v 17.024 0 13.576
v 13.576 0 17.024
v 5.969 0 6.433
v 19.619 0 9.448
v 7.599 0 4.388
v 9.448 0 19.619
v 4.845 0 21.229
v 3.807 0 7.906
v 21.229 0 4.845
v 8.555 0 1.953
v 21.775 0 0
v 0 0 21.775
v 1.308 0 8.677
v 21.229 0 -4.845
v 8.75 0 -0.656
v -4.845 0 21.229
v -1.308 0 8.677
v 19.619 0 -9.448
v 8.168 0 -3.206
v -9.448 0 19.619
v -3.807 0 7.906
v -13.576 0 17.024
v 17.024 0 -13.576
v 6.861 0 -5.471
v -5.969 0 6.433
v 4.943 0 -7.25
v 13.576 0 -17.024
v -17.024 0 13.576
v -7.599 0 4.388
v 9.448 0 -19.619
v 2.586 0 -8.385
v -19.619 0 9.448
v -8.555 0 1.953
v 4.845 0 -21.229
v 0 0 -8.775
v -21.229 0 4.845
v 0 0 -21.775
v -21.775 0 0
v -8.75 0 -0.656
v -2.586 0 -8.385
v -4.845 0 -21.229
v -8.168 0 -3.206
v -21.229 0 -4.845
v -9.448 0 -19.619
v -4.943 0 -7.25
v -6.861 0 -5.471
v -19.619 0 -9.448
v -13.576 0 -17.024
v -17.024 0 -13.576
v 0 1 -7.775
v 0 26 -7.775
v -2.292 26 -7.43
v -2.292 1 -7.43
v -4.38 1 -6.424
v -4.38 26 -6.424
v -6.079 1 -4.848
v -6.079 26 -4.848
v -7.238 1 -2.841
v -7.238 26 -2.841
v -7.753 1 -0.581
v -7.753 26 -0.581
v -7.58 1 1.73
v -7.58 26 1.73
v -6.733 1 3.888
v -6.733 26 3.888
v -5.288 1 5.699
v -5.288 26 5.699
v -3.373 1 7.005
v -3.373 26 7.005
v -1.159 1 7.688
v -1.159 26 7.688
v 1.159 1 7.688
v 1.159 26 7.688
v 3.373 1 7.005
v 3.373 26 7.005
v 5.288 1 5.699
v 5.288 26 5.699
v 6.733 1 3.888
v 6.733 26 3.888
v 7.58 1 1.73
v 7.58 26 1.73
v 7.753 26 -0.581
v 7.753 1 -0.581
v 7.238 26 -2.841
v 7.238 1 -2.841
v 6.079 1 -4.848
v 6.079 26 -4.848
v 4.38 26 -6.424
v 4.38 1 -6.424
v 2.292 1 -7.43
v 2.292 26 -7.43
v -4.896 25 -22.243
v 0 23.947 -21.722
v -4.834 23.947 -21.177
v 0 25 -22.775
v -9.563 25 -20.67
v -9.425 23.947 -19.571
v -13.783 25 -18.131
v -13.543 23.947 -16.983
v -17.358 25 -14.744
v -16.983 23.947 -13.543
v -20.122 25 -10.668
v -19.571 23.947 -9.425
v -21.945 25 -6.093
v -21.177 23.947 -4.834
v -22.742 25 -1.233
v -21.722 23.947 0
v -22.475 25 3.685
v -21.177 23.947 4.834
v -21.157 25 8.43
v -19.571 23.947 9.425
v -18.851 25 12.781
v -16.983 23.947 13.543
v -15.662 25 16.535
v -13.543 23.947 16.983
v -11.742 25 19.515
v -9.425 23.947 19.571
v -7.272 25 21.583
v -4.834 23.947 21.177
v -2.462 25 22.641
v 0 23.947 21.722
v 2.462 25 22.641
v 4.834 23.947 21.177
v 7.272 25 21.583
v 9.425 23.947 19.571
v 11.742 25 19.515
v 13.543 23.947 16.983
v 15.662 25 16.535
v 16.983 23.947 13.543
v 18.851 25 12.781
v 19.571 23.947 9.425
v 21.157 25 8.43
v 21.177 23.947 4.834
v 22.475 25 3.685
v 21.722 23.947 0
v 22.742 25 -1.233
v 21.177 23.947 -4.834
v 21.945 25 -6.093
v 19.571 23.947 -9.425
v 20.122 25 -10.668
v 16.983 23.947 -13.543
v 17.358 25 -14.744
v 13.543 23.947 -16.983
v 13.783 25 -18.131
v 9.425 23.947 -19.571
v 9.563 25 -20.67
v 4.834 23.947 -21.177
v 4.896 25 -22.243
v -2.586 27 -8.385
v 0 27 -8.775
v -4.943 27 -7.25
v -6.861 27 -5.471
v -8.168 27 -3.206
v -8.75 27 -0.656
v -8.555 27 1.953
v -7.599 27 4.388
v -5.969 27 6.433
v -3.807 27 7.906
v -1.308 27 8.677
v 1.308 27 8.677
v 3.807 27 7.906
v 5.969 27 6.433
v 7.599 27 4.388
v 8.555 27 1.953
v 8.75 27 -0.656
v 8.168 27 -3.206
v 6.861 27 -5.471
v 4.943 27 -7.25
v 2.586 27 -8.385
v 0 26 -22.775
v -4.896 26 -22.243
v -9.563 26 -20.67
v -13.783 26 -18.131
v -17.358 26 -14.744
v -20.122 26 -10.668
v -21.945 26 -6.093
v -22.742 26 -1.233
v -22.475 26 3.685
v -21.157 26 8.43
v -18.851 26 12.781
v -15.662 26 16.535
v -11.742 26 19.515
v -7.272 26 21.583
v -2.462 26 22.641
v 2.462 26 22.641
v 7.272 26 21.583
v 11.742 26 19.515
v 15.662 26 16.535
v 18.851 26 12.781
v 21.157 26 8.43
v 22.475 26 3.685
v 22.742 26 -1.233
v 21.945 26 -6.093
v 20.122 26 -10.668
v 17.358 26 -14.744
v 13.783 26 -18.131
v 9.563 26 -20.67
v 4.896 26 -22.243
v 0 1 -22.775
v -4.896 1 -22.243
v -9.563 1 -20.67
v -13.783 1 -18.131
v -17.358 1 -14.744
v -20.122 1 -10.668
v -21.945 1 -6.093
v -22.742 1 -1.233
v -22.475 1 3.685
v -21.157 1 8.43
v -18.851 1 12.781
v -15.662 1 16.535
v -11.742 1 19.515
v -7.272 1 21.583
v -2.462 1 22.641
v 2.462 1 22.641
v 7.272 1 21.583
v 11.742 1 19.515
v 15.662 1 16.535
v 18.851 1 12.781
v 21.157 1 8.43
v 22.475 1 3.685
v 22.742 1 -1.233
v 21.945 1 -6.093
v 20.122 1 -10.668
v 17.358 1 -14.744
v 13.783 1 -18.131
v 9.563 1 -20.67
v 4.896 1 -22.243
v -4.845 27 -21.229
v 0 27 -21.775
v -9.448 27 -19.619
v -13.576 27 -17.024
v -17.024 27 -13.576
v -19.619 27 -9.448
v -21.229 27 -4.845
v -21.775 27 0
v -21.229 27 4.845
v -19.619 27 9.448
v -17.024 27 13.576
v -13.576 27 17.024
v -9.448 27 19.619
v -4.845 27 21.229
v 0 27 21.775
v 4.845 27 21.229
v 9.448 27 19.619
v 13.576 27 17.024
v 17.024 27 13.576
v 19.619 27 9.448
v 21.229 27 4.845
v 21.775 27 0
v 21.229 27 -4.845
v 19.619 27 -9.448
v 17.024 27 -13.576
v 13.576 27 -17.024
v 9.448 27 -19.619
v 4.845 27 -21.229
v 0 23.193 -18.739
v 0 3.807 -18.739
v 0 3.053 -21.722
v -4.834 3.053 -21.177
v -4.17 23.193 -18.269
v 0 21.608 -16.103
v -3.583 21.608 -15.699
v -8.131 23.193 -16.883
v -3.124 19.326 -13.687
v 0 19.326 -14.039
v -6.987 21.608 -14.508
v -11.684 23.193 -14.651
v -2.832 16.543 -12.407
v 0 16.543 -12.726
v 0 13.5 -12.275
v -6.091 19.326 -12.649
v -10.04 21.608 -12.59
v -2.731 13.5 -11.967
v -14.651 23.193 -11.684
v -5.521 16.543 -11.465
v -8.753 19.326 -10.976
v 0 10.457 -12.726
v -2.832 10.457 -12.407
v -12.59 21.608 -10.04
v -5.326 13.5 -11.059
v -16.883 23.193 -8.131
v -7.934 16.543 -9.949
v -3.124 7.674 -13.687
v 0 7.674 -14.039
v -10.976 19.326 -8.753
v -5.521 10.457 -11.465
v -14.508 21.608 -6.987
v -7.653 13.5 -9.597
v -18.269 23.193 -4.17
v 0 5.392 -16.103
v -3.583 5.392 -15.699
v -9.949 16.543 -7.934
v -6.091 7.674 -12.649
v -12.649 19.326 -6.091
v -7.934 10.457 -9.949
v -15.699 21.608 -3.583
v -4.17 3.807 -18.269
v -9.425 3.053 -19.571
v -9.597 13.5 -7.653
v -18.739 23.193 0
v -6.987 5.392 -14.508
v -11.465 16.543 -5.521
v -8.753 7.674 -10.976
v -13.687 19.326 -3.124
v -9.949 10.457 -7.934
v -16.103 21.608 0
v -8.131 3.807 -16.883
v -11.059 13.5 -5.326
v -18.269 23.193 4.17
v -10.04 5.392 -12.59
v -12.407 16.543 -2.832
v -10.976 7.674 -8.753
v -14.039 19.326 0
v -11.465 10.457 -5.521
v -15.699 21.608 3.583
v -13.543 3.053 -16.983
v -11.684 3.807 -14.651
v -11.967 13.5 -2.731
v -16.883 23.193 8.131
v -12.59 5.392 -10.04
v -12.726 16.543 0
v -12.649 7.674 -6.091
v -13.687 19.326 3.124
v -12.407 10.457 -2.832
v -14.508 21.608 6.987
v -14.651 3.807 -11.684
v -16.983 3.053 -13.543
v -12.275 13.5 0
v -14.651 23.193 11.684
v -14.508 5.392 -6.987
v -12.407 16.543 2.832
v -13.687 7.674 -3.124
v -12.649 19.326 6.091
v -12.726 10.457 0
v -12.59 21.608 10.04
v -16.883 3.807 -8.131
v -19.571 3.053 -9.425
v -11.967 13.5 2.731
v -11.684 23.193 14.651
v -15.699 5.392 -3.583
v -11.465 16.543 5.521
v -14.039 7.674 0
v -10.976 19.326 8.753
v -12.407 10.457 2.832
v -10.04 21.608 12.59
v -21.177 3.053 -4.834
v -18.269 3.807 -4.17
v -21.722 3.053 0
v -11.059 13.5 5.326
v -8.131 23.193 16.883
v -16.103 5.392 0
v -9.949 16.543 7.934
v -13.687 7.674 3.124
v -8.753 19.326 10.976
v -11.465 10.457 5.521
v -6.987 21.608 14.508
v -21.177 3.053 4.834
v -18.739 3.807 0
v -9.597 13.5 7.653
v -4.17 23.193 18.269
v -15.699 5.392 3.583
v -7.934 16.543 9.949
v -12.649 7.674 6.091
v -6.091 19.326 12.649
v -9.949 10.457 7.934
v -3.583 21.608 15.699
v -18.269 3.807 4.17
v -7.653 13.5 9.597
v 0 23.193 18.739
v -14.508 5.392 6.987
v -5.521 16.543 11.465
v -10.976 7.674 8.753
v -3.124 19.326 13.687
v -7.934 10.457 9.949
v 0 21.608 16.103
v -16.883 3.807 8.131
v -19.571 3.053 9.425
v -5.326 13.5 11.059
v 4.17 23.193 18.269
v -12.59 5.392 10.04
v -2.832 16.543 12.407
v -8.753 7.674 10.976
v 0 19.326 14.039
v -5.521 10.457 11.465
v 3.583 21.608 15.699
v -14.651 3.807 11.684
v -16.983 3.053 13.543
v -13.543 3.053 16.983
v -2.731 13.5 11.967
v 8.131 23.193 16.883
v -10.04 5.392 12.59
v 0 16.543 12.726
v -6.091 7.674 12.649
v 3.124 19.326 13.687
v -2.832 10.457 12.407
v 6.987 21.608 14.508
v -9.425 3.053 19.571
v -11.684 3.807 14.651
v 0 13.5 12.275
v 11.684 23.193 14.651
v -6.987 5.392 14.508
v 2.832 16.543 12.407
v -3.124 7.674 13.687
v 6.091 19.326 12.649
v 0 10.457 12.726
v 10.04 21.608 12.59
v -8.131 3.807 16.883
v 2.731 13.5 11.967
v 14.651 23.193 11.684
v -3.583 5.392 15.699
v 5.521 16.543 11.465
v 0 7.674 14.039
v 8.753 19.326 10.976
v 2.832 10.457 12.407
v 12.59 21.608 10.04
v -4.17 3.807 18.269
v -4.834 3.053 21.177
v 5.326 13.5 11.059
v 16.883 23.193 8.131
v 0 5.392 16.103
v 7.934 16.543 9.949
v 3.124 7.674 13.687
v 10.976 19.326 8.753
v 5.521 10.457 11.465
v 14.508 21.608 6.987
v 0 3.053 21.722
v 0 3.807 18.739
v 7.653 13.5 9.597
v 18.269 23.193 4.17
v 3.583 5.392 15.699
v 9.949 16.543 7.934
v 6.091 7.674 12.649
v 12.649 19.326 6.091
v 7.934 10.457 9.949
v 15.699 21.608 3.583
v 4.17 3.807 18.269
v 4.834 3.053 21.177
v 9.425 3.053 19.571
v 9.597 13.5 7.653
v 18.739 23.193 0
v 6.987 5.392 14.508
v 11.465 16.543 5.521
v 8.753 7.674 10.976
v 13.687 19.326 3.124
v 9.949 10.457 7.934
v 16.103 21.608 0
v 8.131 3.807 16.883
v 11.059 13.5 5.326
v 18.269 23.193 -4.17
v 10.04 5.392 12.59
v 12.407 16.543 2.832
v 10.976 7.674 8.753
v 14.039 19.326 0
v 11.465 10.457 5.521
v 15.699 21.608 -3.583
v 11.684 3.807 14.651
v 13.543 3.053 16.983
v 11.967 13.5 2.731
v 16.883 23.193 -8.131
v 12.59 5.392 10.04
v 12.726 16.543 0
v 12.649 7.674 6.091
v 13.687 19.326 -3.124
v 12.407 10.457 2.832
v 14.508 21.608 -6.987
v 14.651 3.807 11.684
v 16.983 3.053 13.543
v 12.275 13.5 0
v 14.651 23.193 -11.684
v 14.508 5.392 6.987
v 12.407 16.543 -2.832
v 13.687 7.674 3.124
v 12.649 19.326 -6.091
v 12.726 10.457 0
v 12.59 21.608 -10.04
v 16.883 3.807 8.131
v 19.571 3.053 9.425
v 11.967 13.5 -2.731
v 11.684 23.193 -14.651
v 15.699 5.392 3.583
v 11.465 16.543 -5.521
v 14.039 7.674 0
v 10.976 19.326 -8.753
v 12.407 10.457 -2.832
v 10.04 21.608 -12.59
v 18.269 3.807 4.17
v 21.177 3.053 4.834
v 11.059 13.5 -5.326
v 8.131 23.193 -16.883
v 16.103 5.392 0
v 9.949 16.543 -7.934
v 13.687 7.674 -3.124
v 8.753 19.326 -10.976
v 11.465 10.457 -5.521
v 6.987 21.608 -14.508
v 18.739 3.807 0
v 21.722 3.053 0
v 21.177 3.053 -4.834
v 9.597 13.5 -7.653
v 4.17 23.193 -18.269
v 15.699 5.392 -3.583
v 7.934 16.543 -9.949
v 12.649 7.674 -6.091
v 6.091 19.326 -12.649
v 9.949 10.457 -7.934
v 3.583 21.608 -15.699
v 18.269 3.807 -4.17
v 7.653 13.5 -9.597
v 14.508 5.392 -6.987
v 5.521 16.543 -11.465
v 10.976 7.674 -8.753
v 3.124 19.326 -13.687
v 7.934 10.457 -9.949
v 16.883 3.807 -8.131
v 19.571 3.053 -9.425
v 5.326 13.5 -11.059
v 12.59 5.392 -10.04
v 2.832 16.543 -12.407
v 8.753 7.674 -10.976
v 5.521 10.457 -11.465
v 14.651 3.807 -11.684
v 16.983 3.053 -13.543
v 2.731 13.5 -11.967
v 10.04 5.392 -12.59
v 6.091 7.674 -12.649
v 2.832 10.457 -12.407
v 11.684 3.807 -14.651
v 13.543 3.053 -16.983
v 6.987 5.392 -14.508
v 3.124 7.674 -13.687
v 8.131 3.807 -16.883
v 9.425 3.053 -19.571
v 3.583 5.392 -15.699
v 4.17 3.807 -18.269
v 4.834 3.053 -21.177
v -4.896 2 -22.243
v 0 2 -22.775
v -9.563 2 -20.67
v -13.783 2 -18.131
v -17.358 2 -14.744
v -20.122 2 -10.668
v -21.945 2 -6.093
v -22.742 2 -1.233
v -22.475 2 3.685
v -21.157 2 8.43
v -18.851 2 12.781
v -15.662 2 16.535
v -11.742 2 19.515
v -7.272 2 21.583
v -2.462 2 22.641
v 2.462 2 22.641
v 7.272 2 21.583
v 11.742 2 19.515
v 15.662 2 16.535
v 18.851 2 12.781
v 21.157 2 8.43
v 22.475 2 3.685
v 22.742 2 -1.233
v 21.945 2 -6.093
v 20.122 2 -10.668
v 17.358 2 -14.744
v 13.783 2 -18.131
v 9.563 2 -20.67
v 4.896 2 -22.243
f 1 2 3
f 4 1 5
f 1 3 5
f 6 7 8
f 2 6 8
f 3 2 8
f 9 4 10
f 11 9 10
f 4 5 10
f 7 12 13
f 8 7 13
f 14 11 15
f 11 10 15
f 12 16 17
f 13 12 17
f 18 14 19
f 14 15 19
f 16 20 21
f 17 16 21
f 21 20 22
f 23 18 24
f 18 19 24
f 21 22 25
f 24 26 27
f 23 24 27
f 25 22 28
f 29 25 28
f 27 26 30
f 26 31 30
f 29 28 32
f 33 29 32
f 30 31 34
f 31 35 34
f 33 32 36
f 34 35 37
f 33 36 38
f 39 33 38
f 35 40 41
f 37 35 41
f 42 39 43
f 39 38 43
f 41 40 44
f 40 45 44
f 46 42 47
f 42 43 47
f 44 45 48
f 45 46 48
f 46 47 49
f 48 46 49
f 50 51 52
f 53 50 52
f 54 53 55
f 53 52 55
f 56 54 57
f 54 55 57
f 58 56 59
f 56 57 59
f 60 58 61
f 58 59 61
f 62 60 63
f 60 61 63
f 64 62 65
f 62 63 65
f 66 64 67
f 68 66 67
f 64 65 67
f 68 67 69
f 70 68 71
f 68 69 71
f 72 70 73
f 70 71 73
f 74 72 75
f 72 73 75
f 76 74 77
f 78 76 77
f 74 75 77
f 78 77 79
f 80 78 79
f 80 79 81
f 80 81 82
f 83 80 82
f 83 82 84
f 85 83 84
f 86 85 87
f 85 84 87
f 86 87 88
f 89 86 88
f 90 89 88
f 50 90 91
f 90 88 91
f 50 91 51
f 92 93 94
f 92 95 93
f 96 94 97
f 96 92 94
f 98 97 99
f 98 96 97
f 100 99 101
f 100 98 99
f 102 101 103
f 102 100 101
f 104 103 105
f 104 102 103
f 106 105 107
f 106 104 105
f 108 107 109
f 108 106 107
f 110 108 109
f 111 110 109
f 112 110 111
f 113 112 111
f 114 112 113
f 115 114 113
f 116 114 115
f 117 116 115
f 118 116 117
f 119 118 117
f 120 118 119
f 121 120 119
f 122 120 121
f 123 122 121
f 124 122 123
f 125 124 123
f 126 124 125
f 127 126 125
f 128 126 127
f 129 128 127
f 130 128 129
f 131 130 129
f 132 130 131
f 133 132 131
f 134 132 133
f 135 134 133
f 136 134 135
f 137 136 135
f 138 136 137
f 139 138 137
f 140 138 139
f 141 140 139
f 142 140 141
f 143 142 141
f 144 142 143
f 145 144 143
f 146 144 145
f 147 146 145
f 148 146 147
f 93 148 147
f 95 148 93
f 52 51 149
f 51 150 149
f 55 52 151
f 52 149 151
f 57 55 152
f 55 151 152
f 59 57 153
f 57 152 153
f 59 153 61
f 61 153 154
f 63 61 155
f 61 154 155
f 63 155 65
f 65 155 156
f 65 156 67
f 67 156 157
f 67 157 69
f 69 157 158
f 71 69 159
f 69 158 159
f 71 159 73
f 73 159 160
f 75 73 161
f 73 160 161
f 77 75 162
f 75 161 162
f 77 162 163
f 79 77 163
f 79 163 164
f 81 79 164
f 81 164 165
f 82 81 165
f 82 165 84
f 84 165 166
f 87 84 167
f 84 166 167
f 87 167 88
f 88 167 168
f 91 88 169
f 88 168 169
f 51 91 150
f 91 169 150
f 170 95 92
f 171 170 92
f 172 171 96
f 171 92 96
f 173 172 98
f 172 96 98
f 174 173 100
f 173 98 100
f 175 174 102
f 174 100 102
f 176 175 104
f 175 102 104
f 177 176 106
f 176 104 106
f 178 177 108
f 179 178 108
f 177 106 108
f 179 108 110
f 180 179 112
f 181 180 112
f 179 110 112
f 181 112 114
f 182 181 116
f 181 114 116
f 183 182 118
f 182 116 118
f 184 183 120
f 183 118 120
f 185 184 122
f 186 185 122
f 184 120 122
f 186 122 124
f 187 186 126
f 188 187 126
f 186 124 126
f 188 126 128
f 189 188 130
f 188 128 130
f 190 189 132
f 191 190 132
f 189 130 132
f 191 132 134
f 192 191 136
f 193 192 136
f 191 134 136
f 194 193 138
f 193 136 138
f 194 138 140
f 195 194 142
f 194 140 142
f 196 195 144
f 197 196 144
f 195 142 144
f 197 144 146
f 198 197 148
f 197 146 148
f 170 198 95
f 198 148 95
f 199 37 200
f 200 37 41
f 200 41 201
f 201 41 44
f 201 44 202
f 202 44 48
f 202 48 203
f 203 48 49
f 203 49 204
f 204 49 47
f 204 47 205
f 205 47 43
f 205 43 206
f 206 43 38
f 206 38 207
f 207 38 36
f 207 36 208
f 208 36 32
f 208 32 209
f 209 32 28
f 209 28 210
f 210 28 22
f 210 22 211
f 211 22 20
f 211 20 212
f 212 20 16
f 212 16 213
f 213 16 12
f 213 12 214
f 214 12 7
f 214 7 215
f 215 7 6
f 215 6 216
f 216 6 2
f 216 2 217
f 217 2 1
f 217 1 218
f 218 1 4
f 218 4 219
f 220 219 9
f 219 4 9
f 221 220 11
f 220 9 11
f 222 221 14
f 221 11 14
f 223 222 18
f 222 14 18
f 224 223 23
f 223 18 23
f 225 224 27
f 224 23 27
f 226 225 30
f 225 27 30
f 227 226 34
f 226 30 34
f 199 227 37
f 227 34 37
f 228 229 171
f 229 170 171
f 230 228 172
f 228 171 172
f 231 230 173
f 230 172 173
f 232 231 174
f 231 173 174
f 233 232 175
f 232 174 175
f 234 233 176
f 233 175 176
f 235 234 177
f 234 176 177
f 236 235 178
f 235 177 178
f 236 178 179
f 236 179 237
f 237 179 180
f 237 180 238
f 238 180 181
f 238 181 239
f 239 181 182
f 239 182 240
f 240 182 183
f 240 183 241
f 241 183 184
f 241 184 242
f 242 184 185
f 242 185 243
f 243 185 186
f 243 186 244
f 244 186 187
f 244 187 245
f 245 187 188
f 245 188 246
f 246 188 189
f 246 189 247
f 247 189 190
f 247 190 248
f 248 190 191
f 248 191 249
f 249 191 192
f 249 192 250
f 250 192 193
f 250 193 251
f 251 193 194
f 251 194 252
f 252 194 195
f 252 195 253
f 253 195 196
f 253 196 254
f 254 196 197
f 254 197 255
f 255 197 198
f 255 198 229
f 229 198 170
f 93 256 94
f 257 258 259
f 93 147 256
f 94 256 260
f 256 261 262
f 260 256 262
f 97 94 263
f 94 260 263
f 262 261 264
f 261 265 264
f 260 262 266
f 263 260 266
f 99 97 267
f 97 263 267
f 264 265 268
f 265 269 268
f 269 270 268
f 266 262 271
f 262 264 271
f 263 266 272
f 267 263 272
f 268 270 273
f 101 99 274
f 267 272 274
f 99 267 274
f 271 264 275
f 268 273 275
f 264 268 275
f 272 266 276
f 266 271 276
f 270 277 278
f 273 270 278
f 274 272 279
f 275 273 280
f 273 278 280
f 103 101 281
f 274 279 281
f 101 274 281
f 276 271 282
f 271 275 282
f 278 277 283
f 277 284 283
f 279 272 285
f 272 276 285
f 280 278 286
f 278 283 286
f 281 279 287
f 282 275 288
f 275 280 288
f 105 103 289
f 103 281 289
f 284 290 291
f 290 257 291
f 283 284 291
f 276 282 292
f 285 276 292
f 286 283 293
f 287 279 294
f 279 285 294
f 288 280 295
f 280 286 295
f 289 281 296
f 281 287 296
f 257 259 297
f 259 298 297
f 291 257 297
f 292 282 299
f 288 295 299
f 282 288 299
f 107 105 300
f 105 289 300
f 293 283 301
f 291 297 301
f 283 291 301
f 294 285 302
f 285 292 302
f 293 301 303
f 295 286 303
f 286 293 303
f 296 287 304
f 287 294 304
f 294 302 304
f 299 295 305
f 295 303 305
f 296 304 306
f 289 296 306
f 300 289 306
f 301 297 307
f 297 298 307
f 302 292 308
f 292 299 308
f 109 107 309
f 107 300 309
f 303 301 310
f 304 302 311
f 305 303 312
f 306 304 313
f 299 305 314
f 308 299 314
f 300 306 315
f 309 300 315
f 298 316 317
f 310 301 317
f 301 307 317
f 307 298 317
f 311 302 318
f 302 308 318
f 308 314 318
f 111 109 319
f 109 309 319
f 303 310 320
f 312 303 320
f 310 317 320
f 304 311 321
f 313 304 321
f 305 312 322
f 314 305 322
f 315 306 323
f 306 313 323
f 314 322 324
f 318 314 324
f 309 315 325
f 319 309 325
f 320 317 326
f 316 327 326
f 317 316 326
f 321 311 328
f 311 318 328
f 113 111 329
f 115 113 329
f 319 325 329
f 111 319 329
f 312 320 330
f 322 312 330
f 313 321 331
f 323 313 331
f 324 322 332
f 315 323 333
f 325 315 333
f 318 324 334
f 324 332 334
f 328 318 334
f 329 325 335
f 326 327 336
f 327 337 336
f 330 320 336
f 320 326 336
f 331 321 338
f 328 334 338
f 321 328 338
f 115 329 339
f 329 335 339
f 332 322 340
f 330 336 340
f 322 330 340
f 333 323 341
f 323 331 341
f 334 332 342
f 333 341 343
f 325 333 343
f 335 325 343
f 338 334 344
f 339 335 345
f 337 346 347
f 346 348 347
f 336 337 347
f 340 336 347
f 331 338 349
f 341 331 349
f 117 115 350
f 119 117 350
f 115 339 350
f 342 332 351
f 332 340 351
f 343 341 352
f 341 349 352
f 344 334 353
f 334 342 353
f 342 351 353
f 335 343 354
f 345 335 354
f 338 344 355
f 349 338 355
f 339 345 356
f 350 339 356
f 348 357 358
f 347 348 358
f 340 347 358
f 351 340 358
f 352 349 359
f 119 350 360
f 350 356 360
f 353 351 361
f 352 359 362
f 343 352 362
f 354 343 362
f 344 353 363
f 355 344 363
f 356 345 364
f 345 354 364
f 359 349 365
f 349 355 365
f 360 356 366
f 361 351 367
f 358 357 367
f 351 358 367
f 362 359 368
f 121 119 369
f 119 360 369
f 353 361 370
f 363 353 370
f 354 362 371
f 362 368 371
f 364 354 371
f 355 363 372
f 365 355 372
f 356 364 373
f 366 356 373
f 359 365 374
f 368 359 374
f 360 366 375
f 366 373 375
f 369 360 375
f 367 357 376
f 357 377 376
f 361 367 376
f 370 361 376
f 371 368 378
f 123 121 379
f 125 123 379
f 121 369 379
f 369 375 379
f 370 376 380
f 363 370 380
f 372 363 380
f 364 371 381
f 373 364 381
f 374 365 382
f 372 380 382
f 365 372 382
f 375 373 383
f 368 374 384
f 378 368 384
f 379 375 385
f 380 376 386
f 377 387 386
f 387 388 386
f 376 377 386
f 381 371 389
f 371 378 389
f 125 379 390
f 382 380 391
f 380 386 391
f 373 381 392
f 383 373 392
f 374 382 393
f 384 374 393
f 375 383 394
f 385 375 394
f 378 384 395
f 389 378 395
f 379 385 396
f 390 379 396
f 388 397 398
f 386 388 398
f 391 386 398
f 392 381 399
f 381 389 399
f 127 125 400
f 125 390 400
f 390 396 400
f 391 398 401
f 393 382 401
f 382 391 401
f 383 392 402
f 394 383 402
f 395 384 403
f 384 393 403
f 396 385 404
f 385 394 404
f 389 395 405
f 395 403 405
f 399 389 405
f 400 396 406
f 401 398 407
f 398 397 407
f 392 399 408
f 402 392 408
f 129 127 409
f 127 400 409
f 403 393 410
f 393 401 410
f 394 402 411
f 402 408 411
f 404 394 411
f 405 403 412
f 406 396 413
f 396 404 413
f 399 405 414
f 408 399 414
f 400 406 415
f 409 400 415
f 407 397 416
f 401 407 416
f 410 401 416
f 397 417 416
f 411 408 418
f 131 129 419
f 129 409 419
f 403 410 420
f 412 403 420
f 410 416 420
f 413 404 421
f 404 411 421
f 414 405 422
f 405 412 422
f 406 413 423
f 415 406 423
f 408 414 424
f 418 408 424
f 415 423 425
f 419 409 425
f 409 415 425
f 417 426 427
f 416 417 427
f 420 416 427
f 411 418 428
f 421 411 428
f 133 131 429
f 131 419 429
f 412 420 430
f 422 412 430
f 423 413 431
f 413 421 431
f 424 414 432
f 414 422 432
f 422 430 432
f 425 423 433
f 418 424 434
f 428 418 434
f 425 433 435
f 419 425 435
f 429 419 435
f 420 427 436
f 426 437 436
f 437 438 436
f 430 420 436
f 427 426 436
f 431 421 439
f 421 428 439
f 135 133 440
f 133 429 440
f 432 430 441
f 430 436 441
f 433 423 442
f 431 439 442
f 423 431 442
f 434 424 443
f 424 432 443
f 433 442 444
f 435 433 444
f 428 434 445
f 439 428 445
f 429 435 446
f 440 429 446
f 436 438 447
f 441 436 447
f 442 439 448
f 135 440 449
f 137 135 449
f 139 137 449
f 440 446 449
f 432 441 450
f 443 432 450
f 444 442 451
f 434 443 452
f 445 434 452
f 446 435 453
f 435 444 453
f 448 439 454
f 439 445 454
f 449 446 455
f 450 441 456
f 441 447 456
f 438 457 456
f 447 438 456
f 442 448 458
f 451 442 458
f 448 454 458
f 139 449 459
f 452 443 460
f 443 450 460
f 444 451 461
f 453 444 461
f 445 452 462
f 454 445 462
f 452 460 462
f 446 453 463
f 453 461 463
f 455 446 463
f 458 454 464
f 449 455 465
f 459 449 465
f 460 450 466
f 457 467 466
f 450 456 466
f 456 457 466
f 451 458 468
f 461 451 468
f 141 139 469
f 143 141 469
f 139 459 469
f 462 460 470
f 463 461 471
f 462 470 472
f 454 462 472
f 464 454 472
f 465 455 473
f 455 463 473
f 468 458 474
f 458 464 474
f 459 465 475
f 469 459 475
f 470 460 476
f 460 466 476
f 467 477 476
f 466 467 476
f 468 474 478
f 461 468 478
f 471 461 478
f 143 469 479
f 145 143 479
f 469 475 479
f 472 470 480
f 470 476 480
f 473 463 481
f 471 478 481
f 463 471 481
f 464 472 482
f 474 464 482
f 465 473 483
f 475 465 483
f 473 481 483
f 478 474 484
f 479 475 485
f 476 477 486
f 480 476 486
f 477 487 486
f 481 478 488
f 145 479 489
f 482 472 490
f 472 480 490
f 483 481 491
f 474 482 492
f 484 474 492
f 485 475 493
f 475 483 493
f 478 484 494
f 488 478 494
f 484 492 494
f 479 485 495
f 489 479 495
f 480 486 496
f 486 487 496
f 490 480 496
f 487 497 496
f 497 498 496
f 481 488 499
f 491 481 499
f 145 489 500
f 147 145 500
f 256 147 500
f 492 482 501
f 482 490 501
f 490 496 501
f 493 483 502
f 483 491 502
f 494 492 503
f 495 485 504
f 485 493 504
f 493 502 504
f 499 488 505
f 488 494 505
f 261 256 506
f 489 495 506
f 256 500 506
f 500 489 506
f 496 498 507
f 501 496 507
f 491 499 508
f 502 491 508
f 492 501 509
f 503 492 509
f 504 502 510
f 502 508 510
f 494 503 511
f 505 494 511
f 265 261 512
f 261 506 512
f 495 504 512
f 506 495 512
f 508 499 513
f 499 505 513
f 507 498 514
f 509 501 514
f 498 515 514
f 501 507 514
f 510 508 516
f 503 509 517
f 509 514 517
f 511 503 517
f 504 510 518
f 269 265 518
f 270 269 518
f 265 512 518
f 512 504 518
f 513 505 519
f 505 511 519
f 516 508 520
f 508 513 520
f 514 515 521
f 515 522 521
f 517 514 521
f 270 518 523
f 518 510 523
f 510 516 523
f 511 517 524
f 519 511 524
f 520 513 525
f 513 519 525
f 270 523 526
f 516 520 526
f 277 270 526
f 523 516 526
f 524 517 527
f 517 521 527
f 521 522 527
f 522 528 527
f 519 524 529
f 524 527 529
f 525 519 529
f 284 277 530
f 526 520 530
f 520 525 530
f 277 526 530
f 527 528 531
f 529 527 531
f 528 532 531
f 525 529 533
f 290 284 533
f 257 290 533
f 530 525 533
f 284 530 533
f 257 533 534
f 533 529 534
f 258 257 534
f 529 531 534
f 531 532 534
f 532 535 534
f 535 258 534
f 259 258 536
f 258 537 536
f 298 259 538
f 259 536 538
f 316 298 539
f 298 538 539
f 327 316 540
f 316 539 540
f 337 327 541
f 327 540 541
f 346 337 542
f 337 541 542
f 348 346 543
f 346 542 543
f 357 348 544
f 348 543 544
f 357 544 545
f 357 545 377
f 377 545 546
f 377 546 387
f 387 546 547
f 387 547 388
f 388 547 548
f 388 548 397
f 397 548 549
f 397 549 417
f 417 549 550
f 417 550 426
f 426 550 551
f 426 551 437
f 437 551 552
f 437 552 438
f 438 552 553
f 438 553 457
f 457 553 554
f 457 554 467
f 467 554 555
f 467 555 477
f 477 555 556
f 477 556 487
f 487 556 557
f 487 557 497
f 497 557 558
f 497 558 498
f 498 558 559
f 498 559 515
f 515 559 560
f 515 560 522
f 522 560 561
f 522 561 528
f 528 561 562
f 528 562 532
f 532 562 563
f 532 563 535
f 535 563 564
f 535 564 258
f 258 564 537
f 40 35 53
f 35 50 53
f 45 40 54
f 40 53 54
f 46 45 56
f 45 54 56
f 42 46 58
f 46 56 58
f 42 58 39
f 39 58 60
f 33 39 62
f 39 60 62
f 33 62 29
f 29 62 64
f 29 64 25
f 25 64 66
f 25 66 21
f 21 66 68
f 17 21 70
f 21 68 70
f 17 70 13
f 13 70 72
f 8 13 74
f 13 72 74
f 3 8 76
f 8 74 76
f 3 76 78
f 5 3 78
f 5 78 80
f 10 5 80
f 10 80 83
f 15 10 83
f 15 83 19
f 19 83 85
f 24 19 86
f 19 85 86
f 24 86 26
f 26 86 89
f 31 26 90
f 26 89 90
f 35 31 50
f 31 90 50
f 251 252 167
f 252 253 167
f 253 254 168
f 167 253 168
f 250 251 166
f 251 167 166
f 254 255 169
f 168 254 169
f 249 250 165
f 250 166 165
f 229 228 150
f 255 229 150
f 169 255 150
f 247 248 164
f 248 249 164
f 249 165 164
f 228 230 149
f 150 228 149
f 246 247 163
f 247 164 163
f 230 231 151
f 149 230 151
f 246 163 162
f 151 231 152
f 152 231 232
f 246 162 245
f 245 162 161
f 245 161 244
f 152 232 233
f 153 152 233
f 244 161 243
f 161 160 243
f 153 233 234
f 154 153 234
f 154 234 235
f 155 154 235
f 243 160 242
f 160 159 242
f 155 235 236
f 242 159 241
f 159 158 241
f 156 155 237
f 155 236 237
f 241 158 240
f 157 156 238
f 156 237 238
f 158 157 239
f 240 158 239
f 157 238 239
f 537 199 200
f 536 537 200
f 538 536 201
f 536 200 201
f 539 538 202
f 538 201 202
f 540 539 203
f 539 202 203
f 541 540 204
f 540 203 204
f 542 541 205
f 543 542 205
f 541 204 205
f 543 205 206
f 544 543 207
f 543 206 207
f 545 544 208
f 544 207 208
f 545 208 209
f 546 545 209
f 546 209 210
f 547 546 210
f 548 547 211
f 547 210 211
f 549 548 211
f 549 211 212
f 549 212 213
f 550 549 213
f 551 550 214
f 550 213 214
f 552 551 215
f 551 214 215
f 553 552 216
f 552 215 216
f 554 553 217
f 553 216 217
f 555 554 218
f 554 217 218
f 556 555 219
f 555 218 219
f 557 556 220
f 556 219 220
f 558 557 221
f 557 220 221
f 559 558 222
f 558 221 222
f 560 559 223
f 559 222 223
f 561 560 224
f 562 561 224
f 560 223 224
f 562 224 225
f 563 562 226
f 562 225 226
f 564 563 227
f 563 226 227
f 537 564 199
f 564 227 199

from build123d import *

# Parameters (mm, degrees)
CHAMFER1_SIZE = 1


with BuildPart() as part:
    # Sketch1 → Revolve1 (revolve)
    with BuildSketch(Plane(origin=(0, 0, 0), x_dir=(0, 0, -1), z_dir=(1, 0, 0))):
        with BuildLine():
            ThreePointArc((22.775, 24), (12.275, 13.5), (22.775, 3))
            Line((22.775, 3), (22.775, 0))
            Line((22.775, 0), (7.775, 0))
            Line((7.775, 0), (7.775, 27))
            Line((7.775, 27), (22.775, 27))
            Line((22.775, 27), (22.775, 24))
        make_face()
    revolve(axis=Axis((0, 0, 0), (0, 1, 0)))

    # Chamfer1
    # the kernel refuses this chamfer: 1 mm, written as the material it takes off along each edge
    with BuildSketch(Plane(origin=(0, 3, 0), x_dir=(0, 0, -1), z_dir=(1, 0, 0))) as chamfer1_piece_1:
        with BuildLine():
            Line((21.722073557, 0.052926443), (22.775, -CHAMFER1_SIZE))
            Line((22.775, -CHAMFER1_SIZE), (22.775, 0))
            ThreePointArc((22.775, 0), (22.233019365, 0.013997092), (21.722073557, 0.052926443))
        make_face()
    revolve(axis=Axis((0, 3, 0), (0, 1, 0)), mode=Mode.SUBTRACT)
    with BuildSketch(Plane(origin=(0, 0, 0), x_dir=(0, 0, -1), z_dir=(1, 0, 0))) as chamfer1_piece_2:
        Polygon((22.775, CHAMFER1_SIZE), (22.775 - CHAMFER1_SIZE, 0), (22.775, 0), align=None)
    revolve(axis=Axis((0, 0, 0), (0, 1, 0)), mode=Mode.SUBTRACT)
    with BuildSketch(Plane(origin=(0, 0, 0), x_dir=(0, 0, -1), z_dir=(1, 0, 0))) as chamfer1_piece_3:
        Polygon((7.775 + CHAMFER1_SIZE, 0), (7.775, CHAMFER1_SIZE), (7.775, 0), align=None)
    revolve(axis=Axis((0, 0, 0), (0, 1, 0)), mode=Mode.SUBTRACT)
    with BuildSketch(Plane(origin=(0, 27, 0), x_dir=(0, 0, -1), z_dir=(1, 0, 0))) as chamfer1_piece_4:
        Polygon((7.775, -CHAMFER1_SIZE), (7.775 + CHAMFER1_SIZE, 0), (7.775, 0), align=None)
    revolve(axis=Axis((0, 27, 0), (0, 1, 0)), mode=Mode.SUBTRACT)
    with BuildSketch(Plane(origin=(0, 27, 0), x_dir=(0, 0, -1), z_dir=(1, 0, 0))) as chamfer1_piece_5:
        Polygon((22.775 - CHAMFER1_SIZE, 0), (22.775, -CHAMFER1_SIZE), (22.775, 0), align=None)
    revolve(axis=Axis((0, 27, 0), (0, 1, 0)), mode=Mode.SUBTRACT)
    with BuildSketch(Plane(origin=(0, 24, 0), x_dir=(0, 0, -1), z_dir=(1, 0, 0))) as chamfer1_piece_6:
        with BuildLine():
            Line((21.722073557, -0.052926443), (22.775, CHAMFER1_SIZE))
            Line((22.775, CHAMFER1_SIZE), (22.775, 0))
            ThreePointArc((22.775, 0), (22.233019365, -0.013997092), (21.722073557, -0.052926443))
        make_face()
    revolve(axis=Axis((0, 24, 0), (0, 1, 0)), mode=Mode.SUBTRACT)


solid = part.part
